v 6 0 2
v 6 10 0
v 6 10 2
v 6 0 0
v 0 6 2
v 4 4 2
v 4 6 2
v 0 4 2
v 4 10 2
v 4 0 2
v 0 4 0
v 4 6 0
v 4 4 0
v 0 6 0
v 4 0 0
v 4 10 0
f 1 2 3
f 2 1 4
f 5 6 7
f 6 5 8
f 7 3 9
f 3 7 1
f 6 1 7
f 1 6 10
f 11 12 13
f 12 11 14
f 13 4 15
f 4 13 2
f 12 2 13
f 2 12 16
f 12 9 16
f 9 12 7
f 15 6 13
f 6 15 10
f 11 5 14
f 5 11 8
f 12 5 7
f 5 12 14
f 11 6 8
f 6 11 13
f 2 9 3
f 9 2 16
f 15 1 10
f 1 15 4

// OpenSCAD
union() {
  translate([4, 4, 0]) cube(size=[2,2,2], center=false);

  translate([0, 4, 0]) cube(size=[4,2,2], center=false);

  translate([4, 6, 0]) cube(size=[2,4,2], center=false);

  translate([4, 0, 0]) cube(size=[2,4,2], center=false);
}
